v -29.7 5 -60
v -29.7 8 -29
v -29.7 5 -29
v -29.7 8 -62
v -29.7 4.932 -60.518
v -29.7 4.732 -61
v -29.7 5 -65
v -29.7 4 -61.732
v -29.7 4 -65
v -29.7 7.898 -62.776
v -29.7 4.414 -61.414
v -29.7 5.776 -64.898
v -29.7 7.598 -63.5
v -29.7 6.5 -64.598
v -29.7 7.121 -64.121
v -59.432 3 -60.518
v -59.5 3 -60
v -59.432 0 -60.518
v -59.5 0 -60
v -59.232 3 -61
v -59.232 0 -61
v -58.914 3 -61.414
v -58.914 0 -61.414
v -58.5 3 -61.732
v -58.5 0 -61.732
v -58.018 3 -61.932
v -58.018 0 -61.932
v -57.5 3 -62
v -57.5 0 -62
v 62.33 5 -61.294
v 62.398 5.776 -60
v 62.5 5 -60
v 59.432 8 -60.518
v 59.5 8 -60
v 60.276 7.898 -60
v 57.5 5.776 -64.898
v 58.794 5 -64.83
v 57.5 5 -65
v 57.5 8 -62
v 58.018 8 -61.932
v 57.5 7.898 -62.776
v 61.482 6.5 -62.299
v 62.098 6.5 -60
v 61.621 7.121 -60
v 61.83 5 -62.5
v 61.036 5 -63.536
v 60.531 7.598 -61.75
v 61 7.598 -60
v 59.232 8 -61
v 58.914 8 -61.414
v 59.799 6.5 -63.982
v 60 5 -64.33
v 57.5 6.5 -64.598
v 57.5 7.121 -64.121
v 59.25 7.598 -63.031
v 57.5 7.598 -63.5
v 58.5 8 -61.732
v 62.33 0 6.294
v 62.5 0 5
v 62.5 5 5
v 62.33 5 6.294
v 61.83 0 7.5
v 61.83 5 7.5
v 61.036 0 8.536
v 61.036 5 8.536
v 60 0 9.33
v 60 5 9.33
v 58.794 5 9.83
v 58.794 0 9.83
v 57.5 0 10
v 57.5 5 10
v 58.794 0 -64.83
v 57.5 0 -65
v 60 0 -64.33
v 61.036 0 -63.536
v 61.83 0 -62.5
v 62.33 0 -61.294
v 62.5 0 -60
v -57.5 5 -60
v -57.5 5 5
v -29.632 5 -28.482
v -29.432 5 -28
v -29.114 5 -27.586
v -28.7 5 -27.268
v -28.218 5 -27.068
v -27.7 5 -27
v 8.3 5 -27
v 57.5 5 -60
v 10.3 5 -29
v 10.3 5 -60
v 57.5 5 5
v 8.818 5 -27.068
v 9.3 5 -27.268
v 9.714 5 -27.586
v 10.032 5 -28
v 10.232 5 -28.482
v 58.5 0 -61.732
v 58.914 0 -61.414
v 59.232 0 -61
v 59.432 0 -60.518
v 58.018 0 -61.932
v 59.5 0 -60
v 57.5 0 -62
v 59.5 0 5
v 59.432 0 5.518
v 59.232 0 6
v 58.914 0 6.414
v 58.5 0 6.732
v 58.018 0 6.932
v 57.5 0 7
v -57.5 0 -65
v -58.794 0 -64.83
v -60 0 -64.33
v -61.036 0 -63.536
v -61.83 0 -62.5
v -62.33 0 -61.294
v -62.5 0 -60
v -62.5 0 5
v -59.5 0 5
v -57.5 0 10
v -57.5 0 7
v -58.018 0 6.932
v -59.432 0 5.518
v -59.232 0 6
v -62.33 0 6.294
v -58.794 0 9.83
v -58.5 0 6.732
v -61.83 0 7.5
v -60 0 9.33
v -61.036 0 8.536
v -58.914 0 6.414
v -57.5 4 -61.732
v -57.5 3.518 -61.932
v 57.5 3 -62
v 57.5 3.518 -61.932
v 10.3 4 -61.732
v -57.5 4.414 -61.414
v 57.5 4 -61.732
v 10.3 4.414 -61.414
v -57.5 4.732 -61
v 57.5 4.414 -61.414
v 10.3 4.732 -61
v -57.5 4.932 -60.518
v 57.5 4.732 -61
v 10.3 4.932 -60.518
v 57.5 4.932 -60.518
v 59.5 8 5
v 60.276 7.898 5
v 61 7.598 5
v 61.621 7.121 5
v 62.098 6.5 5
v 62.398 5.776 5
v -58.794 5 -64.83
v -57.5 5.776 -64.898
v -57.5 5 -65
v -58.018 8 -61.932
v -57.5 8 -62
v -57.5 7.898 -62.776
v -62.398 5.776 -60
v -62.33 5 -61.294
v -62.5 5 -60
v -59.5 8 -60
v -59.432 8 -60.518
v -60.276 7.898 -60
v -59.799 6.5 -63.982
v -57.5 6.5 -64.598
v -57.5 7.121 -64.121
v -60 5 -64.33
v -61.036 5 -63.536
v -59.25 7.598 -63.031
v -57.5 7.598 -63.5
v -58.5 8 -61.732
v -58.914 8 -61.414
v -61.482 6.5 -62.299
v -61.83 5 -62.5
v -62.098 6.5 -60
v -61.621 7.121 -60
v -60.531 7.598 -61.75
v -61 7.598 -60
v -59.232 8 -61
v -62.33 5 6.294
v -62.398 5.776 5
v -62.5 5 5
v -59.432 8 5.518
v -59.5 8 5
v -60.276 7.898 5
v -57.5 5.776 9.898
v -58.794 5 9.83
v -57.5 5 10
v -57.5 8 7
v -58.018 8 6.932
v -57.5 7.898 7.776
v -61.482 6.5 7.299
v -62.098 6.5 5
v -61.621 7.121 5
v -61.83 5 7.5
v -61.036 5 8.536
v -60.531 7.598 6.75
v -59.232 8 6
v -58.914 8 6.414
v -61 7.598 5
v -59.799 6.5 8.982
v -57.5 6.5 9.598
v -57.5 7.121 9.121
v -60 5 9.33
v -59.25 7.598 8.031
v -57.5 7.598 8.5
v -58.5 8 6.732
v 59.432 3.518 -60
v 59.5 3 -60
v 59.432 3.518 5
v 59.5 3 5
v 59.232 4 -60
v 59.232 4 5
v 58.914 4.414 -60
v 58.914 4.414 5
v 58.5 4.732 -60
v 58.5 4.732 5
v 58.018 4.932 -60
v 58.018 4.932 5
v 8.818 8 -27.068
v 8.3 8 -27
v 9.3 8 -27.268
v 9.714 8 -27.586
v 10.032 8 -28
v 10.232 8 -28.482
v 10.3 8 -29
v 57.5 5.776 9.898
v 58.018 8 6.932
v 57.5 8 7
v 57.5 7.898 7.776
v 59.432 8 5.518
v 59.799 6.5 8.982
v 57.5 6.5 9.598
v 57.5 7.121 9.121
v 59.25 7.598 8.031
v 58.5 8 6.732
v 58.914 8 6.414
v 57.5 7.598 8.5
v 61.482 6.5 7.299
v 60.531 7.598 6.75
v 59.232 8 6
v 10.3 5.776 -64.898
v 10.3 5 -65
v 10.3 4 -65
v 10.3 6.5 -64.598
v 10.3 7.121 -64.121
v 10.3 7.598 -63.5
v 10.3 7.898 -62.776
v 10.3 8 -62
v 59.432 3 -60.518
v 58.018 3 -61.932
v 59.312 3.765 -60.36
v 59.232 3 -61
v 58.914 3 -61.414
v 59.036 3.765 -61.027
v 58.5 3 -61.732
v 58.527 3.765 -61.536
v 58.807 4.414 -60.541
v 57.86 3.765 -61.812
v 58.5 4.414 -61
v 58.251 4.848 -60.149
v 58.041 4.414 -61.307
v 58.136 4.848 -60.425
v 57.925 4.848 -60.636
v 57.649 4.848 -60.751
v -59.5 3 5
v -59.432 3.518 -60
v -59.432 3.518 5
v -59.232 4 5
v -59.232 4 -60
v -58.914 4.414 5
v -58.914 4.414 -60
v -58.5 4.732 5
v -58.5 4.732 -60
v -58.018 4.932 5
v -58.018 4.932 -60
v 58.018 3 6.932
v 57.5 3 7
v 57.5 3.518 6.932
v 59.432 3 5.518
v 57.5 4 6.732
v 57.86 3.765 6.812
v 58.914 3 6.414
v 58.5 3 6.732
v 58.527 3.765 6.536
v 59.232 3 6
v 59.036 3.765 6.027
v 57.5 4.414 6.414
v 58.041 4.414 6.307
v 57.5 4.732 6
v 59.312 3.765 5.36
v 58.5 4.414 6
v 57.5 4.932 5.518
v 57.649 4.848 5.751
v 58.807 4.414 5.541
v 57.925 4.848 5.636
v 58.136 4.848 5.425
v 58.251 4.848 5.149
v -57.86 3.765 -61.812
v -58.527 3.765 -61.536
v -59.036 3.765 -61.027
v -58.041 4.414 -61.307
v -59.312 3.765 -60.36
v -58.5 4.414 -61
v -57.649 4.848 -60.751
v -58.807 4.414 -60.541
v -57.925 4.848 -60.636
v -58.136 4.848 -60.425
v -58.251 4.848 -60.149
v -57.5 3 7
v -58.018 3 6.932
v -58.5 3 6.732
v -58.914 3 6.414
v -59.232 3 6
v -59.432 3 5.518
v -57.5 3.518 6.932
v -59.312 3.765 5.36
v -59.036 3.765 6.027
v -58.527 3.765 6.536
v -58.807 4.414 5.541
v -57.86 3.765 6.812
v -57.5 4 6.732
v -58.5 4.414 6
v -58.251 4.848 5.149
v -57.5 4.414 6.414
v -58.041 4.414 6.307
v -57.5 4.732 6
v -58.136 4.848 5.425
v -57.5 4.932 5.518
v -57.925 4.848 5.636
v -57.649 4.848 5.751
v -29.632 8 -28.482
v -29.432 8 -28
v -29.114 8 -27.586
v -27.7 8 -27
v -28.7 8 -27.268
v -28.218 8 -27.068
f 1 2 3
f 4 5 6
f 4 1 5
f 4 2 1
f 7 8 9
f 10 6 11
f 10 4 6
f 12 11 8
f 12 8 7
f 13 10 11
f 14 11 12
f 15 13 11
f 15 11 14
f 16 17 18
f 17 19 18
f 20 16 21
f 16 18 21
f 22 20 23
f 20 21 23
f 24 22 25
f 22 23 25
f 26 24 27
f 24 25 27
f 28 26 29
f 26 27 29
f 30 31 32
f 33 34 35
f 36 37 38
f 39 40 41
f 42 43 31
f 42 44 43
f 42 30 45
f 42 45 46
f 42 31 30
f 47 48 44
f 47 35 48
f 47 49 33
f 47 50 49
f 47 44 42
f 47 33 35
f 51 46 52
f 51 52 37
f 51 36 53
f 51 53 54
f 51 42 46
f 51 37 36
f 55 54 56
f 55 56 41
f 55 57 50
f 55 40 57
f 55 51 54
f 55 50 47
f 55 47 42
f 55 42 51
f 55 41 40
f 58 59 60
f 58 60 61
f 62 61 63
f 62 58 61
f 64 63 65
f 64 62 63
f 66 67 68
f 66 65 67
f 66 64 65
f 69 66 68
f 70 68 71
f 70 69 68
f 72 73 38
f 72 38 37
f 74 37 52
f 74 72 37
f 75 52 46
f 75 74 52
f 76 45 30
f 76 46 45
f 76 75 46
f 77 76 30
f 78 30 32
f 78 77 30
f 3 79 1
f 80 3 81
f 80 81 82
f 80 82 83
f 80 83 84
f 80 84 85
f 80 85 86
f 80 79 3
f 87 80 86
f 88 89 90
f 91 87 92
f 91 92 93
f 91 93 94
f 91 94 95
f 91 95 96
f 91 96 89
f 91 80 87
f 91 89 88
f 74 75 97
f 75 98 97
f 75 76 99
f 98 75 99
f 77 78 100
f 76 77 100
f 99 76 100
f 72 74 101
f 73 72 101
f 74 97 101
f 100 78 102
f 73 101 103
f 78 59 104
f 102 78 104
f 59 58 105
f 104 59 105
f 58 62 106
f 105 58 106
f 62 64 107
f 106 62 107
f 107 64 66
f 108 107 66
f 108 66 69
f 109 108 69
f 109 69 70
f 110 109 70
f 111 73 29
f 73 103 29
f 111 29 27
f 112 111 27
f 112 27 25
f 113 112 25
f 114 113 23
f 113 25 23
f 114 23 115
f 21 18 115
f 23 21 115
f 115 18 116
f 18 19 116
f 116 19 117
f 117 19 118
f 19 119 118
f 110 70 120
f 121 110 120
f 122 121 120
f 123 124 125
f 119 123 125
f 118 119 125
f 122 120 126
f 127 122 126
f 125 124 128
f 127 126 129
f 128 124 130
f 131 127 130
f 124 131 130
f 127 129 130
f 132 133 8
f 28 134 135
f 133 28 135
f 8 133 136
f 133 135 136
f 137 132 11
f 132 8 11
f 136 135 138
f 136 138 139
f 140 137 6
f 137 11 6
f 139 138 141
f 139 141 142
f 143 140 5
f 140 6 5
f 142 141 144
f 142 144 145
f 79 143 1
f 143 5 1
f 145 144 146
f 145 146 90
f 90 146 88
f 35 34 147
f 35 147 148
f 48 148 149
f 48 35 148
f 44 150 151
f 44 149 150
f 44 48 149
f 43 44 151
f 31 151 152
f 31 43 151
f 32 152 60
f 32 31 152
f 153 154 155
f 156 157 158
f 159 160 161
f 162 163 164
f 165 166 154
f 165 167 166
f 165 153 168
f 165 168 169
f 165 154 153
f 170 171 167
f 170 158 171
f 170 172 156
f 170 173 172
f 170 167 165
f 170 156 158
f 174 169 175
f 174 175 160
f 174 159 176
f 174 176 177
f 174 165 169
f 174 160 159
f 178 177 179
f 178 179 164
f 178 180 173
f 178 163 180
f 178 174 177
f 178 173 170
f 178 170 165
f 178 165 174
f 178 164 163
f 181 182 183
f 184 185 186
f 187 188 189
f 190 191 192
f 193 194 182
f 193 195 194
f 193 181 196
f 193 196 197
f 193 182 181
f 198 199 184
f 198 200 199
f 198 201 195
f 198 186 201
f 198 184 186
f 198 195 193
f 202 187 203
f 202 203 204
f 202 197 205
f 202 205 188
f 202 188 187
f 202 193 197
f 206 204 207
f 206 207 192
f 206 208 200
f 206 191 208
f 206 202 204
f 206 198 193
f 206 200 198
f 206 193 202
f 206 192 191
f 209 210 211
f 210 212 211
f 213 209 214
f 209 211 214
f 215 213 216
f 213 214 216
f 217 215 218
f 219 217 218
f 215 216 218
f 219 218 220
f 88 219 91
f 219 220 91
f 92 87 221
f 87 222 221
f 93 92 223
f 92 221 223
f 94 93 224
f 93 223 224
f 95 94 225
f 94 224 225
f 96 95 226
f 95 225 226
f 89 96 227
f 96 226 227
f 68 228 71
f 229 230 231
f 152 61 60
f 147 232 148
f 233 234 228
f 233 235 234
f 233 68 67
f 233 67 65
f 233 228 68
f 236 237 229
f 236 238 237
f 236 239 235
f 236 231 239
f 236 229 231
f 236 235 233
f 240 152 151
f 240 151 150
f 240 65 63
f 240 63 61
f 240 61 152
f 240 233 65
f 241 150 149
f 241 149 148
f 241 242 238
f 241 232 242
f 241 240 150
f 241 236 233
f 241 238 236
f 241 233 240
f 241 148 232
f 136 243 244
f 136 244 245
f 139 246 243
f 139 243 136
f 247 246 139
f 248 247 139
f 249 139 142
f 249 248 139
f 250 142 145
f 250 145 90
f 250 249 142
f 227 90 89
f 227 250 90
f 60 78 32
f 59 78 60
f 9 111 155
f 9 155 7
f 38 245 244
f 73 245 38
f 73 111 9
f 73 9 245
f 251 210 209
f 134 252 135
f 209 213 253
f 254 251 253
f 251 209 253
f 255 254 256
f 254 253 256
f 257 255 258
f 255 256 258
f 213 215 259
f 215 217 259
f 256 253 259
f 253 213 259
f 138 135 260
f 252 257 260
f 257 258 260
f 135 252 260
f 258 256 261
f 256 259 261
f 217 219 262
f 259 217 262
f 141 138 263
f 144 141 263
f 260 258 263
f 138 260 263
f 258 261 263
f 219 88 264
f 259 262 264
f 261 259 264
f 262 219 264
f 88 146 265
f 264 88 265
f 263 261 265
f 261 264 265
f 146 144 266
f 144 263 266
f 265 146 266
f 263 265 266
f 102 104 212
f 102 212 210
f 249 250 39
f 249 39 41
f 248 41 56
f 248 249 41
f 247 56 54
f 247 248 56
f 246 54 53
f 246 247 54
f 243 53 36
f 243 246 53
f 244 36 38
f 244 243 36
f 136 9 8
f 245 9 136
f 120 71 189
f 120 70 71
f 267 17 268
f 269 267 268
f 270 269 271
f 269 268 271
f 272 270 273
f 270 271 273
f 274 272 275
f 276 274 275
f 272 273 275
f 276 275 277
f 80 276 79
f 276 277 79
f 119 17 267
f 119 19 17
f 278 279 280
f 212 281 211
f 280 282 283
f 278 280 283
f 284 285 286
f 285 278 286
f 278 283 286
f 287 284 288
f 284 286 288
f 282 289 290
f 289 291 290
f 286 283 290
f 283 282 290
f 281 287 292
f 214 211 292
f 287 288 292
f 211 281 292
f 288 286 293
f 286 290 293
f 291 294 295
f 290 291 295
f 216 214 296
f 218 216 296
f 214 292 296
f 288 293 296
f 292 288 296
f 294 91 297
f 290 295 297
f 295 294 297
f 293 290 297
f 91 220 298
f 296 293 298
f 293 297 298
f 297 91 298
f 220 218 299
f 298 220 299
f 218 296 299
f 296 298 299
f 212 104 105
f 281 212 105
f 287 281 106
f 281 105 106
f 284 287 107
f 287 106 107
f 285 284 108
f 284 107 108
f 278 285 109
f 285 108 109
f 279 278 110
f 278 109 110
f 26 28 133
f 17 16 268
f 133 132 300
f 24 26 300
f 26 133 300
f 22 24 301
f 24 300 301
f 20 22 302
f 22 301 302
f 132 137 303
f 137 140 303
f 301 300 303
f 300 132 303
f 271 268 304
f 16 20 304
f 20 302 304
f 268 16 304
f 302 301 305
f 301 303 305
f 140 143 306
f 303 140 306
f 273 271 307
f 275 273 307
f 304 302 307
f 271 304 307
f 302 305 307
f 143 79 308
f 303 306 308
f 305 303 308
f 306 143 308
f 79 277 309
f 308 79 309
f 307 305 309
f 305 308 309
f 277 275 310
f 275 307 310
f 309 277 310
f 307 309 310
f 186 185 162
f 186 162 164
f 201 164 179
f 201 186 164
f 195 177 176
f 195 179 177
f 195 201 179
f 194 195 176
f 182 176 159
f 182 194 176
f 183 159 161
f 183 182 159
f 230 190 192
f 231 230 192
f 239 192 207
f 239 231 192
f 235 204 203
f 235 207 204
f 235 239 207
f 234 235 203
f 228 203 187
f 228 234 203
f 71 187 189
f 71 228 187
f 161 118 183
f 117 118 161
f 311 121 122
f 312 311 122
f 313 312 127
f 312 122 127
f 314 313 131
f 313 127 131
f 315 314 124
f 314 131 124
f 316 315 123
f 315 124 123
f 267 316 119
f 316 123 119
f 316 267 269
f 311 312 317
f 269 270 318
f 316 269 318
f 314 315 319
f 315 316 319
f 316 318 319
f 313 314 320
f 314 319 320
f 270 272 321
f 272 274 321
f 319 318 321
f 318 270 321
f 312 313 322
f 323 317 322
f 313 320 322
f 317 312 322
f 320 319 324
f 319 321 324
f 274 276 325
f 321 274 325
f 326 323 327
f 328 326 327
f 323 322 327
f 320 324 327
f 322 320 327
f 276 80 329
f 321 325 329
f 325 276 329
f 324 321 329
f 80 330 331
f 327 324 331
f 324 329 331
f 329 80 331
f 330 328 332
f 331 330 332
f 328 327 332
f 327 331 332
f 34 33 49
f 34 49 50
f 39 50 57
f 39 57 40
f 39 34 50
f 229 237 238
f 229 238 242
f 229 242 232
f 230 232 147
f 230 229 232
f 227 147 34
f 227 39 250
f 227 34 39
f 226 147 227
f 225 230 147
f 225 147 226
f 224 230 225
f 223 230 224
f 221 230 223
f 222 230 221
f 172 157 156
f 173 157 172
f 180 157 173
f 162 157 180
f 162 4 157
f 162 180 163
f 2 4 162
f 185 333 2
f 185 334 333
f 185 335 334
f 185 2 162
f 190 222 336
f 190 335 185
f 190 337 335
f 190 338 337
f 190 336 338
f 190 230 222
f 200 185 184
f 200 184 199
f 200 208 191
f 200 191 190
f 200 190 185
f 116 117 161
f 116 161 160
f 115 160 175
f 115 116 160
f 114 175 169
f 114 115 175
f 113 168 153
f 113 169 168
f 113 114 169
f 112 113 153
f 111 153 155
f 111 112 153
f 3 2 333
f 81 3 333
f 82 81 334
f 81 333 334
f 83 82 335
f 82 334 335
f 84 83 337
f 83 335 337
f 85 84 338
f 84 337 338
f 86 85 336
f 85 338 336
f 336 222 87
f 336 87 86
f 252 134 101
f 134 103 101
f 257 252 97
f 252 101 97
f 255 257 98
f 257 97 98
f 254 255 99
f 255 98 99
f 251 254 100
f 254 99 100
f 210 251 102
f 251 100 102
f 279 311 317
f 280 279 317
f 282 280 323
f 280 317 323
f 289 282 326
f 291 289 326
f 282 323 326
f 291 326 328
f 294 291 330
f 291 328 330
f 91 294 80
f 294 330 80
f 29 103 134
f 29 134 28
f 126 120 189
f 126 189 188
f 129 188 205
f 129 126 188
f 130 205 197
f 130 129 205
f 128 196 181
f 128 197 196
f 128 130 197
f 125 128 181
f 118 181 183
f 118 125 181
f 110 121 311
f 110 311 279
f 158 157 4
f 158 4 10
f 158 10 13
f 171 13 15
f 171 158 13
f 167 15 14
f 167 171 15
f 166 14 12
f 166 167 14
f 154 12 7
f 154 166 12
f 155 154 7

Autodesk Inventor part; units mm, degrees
ref_plane "YZ Plane" through (0, 0, 0) normal (1, 0, 0) x (0, 1, 0)
ref_plane "XZ Plane" through (0, 0, 0) normal (0, 1, 0) x (-1, 0, 0)
ref_plane "XY Plane" through (0, 0, 0) normal (0, 0, 1) x (1, 0, 0)
sketch "Sketch1" plane through (0, 0, 0) normal (0, 1, 0) x (-1, 0, 0)
  line L0 (57.5, -65) -> (-57.5, -65)
  line L1 (-62.5, -60) -> (-62.5, 5)
  line L2 (-57.5, 10) -> (57.5, 10)
  line L3 (62.5, 5) -> (62.5, -60)
  arc A0 (-57.5, 10) -> (-62.5, 5) centre (-57.5, 5) ccw
  arc A1 (62.5, 5) -> (57.5, 10) centre (57.5, 5) ccw
  arc A2 (57.5, -65) -> (62.5, -60) centre (57.5, -60) ccw
  arc A3 (-62.5, -60) -> (-57.5, -65) centre (-57.5, -60) ccw
  line L4 (0, 10) -> (0, -20.4446) construction
  point P0 (0, 0)
  point P1 (62.5, -65)
  point P2 (-62.5, 10)
  point P3 (62.5, 10)
  dimension "d0" = 125
  dimension "d4" = 75
  dimension "d5" = 5
  dimension "d9" = 10
extrude "Extrusion1" add sketch "Sketch1" along normal blind 8
fillet "Fillet1" radius 3 8 edges at (-61.0355, 8, 8.5355) (0, 8, 10) (61.0355, 8, 8.5355) (62.5, 8, -27.5) (61.0355, 8, -63.5355) (0, 8, -65) (-61.0355, 8, -63.5355) (-62.5, 8, -27.5)
sketch "Sketch2" plane through (0, 0, 0) normal (0, -1, 0) x (1, 0, 0)
  line L0 (62.5, 5) -> (62.5, -60) projected
  arc A0 (62.5, 5) -> (57.5, 10) centre (57.5, 5) ccw projected
  line L1 (-57.5, 10) -> (57.5, 10) projected
  arc A1 (-57.5, 10) -> (-62.5, 5) centre (-57.5, 5) ccw projected
  line L2 (-62.5, -60) -> (-62.5, 5) projected
  arc A2 (-62.5, -60) -> (-57.5, -65) centre (-57.5, -60) ccw projected
  line L3 (57.5, -65) -> (-57.5, -65) projected
  arc A3 (57.5, -65) -> (62.5, -60) centre (57.5, -60) ccw projected
  arc A4 (59.5, 5) -> (57.5, 7) centre (57.5, 5) ccw
  line L4 (59.5, 5) -> (59.5, -60)
  arc A5 (57.5, -62) -> (59.5, -60) centre (57.5, -60) ccw
  line L5 (57.5, -62) -> (-57.5, -62)
  arc A6 (-59.5, -60) -> (-57.5, -62) centre (-57.5, -60) ccw
  line L6 (-59.5, -60) -> (-59.5, 5)
  arc A7 (-57.5, 7) -> (-59.5, 5) centre (-57.5, 5) ccw
  line L7 (-57.5, 7) -> (57.5, 7)
  point P0 (0, 0)
  dimension "d10" = 3
extrude "Extrusion2" cut sketch "Sketch2" against normal blind 5 contours L4 A5 L5 A6 L6 A7 L7 A4
fillet "Fillet2" radius 2 8 edges at (-58.9142, 5, -61.4142) (-59.5, 5, -27.5) (-58.9142, 5, 6.4142) (0, 5, 7) (58.9142, 5, 6.4142) (59.5, 5, -27.5) (58.9142, 5, -61.4142) (0, 5, -62)
sketch "Sketch3" plane through (0, 8, 0) normal (0, 1, 0) x (1, 0, 0)
  line L0 (-57.5, 62) -> (57.5, 62) projected
  line L1 (-27.7, 67) -> (8.3, 67)
  line L2 (10.3, 65) -> (10.3, 29)
  line L3 (8.3, 27) -> (-27.7, 27)
  line L4 (-29.7, 29) -> (-29.7, 65)
  arc A0 (-27.7, 67) -> (-29.7, 65) centre (-27.7, 65) ccw
  arc A1 (10.3, 65) -> (8.3, 67) centre (8.3, 65) ccw
  arc A2 (8.3, 27) -> (10.3, 29) centre (8.3, 29) ccw
  arc A3 (-29.7, 29) -> (-27.7, 27) centre (-27.7, 29) ccw
  line L5 (62.5, -5) -> (62.5, 60) projected
  line L6 (-62.5, 60) -> (-62.5, -5) projected
  point P0 (0, 0)
  point P1 (10.3, 27)
  point P2 (10.3, 67)
  point P3 (-29.7, 27)
  point P4 (-9.7, 67)
  dimension "d14" = 40
  dimension "d15" = 40
  dimension "d16" = 2
  dimension "d17" = 5
  dimension "d21" = 52.8
extrude "Extrusion3" cut sketch "Sketch3" against normal blind 4
properties part number "Beta_V2_Top01"
